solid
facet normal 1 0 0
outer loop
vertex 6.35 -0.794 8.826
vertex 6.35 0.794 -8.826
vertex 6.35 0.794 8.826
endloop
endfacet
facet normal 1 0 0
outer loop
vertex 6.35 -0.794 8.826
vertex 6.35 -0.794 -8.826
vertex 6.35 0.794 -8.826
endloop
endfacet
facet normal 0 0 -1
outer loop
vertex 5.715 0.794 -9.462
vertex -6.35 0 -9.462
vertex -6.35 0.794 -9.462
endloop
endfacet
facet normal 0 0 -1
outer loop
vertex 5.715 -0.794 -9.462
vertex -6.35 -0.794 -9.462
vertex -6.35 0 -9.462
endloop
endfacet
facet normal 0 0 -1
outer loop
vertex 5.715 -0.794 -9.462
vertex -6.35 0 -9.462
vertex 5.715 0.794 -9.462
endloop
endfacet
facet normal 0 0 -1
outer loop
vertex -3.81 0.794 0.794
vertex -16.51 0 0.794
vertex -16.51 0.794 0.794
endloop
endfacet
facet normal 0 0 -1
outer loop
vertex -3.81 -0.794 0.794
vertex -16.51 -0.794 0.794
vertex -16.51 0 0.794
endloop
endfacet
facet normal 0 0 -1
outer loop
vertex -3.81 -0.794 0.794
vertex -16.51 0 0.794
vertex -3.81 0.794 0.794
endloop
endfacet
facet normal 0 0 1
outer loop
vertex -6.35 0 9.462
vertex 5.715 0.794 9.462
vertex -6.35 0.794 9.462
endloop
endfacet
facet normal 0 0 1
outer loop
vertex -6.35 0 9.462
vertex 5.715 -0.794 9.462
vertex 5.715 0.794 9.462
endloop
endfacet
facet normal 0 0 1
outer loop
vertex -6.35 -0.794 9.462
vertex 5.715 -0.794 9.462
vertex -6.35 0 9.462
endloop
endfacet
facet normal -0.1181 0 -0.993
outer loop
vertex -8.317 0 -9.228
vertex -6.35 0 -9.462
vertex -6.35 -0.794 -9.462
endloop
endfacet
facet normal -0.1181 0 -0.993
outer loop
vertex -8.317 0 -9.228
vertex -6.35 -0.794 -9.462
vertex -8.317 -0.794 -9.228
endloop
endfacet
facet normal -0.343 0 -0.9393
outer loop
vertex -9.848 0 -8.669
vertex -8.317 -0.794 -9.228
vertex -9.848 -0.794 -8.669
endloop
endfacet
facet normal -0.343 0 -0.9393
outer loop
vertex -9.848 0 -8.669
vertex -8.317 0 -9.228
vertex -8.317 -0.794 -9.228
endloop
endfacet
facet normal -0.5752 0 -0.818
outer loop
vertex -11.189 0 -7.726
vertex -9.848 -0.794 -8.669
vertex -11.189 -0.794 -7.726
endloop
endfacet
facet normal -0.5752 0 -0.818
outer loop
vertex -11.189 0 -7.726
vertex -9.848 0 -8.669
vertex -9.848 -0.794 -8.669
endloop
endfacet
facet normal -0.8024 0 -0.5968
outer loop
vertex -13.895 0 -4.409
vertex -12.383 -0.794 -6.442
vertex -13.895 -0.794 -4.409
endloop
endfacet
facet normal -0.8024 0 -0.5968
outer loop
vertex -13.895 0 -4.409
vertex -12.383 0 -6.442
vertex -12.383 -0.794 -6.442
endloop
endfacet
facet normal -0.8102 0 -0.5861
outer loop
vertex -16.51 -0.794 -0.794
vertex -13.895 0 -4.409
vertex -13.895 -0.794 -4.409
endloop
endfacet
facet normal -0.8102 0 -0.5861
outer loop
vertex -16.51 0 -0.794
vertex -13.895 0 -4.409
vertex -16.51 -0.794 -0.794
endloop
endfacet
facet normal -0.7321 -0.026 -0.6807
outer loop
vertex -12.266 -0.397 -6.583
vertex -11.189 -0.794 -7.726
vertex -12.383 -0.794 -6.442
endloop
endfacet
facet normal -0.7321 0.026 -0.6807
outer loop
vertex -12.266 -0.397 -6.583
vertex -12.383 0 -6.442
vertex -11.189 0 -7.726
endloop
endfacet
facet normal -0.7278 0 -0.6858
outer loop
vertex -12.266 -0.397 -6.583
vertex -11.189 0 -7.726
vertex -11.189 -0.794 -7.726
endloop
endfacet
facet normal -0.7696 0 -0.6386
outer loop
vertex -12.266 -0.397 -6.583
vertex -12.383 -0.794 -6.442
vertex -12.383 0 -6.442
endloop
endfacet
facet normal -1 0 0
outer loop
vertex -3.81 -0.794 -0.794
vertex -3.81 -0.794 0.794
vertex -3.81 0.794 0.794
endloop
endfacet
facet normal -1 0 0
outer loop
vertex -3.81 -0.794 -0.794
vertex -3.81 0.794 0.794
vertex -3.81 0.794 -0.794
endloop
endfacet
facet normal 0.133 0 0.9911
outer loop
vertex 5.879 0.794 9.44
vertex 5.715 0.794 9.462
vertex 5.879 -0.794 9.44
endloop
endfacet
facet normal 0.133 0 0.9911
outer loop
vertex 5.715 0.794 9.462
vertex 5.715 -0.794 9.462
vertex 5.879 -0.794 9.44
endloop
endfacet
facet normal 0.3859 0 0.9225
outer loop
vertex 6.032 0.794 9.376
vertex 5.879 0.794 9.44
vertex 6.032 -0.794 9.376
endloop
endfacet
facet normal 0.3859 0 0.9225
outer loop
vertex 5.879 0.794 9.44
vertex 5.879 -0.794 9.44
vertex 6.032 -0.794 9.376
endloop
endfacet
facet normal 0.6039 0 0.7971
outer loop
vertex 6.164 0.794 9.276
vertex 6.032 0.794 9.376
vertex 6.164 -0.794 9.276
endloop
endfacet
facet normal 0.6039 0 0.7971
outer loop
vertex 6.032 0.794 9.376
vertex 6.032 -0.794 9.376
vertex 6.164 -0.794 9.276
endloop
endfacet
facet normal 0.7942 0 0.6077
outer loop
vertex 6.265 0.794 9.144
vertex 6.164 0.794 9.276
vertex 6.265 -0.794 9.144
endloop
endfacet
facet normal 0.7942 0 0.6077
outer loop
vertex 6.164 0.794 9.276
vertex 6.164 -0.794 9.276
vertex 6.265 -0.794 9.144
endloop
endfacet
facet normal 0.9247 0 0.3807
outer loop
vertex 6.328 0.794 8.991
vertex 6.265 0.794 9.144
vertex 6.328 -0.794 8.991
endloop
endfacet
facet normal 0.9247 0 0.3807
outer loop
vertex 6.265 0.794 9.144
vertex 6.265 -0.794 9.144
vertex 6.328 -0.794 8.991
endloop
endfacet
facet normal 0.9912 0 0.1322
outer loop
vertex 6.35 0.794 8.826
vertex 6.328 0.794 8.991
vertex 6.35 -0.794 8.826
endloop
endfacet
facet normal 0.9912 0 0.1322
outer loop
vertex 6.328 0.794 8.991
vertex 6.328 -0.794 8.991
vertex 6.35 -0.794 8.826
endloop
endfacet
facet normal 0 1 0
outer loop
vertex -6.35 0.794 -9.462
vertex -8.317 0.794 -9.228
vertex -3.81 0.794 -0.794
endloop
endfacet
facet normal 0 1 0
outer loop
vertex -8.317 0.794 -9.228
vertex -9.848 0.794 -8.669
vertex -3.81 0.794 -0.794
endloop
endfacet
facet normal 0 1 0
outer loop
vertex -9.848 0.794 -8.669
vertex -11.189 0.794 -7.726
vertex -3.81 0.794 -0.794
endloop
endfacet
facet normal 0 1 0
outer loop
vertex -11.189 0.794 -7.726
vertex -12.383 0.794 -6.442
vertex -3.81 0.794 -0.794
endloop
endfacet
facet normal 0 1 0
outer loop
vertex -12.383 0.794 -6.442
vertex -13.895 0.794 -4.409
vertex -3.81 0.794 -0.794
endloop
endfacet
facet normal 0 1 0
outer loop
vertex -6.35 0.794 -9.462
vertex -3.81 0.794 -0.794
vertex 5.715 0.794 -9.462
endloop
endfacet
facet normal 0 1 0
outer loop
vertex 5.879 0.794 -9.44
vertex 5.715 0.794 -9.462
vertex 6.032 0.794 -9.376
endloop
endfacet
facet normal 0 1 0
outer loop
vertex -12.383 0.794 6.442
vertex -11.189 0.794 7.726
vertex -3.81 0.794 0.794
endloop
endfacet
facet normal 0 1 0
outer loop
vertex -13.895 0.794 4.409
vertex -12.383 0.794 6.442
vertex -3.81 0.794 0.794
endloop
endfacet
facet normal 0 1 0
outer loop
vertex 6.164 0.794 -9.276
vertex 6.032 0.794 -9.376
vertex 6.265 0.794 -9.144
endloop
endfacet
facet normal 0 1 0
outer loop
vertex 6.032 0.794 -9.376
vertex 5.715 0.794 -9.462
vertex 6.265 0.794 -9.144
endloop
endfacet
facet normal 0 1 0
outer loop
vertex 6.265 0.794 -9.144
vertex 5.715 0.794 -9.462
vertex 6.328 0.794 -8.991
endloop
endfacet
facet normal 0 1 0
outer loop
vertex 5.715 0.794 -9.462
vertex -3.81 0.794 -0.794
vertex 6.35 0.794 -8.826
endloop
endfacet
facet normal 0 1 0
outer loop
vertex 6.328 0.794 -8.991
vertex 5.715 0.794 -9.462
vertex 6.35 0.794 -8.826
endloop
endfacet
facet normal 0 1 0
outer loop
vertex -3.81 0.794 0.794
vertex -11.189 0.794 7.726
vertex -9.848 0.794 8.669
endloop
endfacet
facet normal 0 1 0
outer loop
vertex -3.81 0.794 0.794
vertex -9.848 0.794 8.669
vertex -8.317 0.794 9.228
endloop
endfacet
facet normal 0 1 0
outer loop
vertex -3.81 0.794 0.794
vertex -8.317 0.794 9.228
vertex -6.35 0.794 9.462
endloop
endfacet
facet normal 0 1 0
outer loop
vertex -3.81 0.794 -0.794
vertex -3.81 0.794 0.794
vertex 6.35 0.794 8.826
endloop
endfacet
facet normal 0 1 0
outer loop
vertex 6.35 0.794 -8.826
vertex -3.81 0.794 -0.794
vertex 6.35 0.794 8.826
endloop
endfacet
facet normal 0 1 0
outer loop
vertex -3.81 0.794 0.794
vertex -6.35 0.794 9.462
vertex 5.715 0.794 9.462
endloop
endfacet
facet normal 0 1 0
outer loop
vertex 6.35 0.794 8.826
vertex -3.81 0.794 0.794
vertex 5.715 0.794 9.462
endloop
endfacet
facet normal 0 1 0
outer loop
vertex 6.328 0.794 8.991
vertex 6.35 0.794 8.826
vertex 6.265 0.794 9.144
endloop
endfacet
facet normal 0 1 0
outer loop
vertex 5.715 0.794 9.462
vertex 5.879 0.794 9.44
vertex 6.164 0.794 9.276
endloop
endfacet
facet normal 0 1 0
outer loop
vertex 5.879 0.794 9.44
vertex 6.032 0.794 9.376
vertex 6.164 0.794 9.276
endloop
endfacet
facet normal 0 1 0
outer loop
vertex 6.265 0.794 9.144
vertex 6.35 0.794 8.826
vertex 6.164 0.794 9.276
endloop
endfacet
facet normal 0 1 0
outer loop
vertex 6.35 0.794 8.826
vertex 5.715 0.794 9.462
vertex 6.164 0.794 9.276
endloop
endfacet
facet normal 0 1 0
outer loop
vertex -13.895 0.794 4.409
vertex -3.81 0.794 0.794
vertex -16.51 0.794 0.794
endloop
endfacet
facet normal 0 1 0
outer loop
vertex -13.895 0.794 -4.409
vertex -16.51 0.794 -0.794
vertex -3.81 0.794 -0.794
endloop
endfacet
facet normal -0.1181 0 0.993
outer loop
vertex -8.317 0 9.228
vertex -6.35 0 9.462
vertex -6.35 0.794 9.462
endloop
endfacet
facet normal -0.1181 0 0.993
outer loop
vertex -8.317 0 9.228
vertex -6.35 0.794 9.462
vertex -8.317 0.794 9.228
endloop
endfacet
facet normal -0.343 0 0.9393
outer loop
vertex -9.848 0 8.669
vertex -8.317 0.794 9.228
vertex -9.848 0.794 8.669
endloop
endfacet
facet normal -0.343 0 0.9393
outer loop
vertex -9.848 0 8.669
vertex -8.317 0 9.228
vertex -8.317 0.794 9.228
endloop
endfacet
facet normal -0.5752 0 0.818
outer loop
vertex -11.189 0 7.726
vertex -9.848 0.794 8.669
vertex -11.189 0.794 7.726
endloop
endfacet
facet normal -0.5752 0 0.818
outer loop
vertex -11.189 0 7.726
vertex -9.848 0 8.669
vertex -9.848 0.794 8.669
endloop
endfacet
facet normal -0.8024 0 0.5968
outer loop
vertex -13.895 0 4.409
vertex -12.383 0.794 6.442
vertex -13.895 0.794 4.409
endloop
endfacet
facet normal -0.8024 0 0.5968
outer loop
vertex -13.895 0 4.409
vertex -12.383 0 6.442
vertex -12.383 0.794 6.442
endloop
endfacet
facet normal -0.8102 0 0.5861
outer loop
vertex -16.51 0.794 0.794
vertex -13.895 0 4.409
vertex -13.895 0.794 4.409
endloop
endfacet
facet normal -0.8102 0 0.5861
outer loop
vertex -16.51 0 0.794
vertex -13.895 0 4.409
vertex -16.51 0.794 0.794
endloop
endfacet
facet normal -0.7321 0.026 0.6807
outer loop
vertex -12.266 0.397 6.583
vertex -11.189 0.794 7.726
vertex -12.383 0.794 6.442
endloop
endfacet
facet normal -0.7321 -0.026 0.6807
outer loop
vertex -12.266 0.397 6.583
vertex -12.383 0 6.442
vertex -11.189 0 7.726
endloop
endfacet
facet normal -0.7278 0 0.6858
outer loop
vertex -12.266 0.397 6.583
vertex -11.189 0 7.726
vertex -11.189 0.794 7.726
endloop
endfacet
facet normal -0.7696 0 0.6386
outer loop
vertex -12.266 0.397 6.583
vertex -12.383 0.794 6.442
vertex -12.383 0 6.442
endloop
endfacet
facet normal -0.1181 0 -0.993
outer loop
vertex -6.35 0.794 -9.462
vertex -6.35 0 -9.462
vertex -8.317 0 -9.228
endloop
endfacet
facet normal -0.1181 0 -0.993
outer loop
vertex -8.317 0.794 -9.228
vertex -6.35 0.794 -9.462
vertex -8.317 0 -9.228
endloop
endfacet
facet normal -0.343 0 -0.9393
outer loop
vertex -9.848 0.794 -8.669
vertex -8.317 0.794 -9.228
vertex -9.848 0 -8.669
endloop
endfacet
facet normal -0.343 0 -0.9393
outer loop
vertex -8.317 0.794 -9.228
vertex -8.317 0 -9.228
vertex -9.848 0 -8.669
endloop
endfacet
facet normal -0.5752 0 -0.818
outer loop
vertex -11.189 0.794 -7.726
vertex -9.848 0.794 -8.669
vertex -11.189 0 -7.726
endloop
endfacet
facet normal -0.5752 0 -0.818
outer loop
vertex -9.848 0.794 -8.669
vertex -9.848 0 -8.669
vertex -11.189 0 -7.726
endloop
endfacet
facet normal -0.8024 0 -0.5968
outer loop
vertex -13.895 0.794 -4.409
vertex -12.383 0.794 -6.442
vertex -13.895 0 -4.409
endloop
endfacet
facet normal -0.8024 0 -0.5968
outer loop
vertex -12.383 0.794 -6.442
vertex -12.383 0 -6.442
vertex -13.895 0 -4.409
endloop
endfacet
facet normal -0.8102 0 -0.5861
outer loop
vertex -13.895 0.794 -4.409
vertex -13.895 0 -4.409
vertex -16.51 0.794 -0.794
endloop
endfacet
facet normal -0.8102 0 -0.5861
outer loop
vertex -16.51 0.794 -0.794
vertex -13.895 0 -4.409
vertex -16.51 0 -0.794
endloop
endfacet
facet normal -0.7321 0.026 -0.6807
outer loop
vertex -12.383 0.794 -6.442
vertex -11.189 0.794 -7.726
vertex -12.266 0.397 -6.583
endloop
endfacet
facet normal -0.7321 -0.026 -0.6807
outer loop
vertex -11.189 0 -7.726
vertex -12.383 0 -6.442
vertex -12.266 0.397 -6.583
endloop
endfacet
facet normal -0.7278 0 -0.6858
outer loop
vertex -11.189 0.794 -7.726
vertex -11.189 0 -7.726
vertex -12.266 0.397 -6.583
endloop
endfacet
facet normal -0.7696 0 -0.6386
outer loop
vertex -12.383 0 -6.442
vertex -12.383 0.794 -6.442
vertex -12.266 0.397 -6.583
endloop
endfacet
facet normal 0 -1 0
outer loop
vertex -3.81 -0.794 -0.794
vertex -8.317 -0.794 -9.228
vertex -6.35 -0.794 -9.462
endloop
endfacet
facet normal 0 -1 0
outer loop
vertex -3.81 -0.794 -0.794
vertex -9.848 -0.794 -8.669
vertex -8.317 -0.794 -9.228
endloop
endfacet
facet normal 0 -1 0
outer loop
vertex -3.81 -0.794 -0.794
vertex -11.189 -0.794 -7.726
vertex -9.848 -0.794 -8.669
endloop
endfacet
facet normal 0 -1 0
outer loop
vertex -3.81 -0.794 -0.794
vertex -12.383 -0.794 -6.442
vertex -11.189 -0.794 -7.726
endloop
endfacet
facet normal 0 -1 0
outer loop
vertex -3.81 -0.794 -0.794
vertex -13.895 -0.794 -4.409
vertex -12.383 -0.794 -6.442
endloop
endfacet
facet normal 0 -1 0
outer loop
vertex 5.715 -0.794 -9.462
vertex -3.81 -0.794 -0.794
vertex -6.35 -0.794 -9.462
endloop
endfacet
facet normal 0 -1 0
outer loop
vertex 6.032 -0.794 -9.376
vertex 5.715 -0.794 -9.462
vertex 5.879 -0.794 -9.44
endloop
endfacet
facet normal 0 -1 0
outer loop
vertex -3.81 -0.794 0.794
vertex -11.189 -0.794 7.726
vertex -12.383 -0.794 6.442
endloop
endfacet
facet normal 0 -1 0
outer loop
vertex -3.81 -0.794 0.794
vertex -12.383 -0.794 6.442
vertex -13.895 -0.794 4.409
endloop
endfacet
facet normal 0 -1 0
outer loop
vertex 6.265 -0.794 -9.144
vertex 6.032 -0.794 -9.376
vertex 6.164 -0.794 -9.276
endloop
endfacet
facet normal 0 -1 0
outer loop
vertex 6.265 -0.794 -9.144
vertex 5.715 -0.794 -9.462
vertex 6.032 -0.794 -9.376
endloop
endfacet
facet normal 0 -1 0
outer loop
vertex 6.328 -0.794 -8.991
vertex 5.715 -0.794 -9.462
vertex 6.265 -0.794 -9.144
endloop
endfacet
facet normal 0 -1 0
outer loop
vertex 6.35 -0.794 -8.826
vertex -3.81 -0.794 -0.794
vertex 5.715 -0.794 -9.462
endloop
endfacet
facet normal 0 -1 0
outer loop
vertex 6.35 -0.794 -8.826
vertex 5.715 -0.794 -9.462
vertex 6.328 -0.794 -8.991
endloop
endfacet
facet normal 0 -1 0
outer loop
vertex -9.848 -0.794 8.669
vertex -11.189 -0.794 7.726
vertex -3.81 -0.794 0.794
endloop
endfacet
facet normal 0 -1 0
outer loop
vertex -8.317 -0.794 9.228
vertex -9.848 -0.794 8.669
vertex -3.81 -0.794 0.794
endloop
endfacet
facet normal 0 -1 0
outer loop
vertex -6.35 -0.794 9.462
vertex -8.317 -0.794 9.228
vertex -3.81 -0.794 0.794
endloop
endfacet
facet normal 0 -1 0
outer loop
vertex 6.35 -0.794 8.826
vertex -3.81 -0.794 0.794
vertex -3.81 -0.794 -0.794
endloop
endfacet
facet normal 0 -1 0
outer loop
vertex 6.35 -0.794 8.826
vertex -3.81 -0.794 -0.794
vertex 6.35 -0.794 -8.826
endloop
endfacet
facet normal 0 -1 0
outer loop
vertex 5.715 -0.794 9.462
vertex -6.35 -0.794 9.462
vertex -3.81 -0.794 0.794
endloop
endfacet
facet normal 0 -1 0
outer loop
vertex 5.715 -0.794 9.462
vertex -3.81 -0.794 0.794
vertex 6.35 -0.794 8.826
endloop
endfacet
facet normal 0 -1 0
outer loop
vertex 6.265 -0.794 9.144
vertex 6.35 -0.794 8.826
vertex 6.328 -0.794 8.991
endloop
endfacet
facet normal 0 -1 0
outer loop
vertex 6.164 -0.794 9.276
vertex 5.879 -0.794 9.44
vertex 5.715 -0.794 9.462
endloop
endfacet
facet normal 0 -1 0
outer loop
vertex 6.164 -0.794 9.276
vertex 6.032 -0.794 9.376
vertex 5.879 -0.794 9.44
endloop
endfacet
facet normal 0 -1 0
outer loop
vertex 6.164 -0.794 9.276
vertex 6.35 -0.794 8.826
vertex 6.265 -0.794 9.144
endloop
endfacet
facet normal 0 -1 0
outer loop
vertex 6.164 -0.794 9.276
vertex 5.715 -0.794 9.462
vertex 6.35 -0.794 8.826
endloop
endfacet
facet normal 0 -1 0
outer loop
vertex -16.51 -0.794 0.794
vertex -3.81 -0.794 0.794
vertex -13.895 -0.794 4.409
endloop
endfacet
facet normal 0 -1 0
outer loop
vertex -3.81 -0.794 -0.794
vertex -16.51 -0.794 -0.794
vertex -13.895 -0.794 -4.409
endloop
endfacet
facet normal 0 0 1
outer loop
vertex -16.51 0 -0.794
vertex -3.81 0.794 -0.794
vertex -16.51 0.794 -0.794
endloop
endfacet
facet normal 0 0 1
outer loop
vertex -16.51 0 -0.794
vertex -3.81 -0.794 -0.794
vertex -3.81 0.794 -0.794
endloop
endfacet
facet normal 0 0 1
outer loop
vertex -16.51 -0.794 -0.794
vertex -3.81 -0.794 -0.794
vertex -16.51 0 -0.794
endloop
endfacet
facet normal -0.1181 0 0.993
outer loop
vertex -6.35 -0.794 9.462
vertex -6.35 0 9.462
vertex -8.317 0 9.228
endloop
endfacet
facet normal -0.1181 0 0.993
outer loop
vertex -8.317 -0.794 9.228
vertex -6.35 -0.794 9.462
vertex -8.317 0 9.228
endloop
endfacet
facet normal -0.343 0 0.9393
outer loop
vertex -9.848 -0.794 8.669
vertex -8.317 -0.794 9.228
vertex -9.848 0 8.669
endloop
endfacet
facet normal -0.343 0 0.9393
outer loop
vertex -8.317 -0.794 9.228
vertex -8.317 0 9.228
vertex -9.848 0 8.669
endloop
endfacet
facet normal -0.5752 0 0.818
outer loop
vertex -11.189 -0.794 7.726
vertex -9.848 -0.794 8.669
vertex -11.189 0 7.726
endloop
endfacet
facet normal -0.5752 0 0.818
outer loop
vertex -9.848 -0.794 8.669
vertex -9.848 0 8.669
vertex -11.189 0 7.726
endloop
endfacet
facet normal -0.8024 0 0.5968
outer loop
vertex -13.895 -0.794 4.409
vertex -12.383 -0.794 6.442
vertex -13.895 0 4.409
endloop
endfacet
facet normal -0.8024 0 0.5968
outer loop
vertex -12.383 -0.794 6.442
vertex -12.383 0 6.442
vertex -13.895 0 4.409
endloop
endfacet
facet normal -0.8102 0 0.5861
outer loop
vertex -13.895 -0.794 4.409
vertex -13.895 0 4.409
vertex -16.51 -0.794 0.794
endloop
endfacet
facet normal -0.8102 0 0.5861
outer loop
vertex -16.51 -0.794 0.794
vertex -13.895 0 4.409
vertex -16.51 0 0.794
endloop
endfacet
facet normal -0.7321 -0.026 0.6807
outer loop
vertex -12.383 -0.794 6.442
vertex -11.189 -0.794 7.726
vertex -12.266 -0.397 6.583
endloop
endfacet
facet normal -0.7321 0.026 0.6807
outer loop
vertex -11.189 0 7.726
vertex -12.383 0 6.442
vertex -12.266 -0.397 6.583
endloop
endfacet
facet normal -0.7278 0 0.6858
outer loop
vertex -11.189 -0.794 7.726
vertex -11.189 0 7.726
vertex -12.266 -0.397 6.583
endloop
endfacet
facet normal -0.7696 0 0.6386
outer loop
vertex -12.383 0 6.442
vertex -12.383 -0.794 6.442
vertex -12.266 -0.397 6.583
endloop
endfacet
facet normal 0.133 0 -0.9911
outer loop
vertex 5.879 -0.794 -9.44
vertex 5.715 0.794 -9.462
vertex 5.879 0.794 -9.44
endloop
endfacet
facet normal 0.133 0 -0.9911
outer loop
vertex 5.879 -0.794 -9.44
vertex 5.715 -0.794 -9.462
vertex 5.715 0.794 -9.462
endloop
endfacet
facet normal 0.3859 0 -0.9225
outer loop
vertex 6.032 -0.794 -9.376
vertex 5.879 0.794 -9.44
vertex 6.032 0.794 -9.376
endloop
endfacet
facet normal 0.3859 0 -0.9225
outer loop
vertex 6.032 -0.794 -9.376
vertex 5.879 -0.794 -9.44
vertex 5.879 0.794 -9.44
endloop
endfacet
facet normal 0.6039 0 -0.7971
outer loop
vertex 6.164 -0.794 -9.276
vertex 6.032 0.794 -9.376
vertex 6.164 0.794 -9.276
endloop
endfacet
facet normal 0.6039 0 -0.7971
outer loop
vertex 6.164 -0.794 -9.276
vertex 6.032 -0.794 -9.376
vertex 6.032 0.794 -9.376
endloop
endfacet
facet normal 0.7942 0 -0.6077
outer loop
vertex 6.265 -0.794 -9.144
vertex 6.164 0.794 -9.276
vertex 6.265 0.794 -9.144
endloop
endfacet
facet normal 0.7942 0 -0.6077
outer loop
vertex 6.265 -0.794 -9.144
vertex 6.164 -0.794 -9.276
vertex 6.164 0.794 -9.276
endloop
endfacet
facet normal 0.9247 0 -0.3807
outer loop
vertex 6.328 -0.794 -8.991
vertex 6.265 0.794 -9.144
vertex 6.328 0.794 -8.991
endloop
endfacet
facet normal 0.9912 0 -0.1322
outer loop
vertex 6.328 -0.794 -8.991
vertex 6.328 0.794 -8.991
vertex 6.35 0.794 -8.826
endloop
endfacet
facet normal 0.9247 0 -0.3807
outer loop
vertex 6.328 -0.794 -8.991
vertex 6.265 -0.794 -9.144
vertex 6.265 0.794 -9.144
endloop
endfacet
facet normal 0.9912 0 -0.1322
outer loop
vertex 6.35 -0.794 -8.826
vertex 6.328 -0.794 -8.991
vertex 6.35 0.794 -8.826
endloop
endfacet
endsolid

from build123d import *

# Parameters (mm, degrees)
F1_DEPTH = 0.79375
F2_R     = 0.635


with BuildPart() as f1:
    # F0 (on Front) → F1 (new body, symmetric)
    with BuildSketch(Plane.XZ):
        with BuildLine():
            Line((-6.35, -9.4615), (6.35, -9.4615))
            Line((6.35, -9.4615), (6.35, 9.4615))
            Line((6.35, 9.4615), (-6.35, 9.4615))
            add(Edge.make_bspline(
                [(-6.35, 9.4615), (-9.4238393137, 9.3856386824), (-12.3985658508, 7.064816161), (-15.0919286534, 2.519920934), (-16.51, 0.79375)],
                knots=[0, 0, 0, 0, 0.4891154758, 1, 1, 1, 1], degree=3))
            Line((-16.51, 0.79375), (-3.81, 0.79375))
            Line((-3.81, 0.79375), (-3.81, -0.79375))
            Line((-3.81, -0.79375), (-16.51, -0.79375))
            add(Edge.make_bspline(
                [(-6.35, -9.4615), (-9.4238393137, -9.3856386824), (-12.3985658508, -7.064816161), (-15.0919286534, -2.519920934), (-16.51, -0.79375)],
                knots=[0, 0, 0, 0, 0.4891154758, 1, 1, 1, 1], degree=3))
        make_face()
    extrude(amount=F1_DEPTH, both=True)

    # F2
    f2_edges = [f1.edges().sort_by_distance(p)[0] for p in [
        (6.35, 0, 9.4615),
        (6.35, 0, -9.4615),
    ]]
    fillet(f2_edges, radius=F2_R)


solid = f1.part
